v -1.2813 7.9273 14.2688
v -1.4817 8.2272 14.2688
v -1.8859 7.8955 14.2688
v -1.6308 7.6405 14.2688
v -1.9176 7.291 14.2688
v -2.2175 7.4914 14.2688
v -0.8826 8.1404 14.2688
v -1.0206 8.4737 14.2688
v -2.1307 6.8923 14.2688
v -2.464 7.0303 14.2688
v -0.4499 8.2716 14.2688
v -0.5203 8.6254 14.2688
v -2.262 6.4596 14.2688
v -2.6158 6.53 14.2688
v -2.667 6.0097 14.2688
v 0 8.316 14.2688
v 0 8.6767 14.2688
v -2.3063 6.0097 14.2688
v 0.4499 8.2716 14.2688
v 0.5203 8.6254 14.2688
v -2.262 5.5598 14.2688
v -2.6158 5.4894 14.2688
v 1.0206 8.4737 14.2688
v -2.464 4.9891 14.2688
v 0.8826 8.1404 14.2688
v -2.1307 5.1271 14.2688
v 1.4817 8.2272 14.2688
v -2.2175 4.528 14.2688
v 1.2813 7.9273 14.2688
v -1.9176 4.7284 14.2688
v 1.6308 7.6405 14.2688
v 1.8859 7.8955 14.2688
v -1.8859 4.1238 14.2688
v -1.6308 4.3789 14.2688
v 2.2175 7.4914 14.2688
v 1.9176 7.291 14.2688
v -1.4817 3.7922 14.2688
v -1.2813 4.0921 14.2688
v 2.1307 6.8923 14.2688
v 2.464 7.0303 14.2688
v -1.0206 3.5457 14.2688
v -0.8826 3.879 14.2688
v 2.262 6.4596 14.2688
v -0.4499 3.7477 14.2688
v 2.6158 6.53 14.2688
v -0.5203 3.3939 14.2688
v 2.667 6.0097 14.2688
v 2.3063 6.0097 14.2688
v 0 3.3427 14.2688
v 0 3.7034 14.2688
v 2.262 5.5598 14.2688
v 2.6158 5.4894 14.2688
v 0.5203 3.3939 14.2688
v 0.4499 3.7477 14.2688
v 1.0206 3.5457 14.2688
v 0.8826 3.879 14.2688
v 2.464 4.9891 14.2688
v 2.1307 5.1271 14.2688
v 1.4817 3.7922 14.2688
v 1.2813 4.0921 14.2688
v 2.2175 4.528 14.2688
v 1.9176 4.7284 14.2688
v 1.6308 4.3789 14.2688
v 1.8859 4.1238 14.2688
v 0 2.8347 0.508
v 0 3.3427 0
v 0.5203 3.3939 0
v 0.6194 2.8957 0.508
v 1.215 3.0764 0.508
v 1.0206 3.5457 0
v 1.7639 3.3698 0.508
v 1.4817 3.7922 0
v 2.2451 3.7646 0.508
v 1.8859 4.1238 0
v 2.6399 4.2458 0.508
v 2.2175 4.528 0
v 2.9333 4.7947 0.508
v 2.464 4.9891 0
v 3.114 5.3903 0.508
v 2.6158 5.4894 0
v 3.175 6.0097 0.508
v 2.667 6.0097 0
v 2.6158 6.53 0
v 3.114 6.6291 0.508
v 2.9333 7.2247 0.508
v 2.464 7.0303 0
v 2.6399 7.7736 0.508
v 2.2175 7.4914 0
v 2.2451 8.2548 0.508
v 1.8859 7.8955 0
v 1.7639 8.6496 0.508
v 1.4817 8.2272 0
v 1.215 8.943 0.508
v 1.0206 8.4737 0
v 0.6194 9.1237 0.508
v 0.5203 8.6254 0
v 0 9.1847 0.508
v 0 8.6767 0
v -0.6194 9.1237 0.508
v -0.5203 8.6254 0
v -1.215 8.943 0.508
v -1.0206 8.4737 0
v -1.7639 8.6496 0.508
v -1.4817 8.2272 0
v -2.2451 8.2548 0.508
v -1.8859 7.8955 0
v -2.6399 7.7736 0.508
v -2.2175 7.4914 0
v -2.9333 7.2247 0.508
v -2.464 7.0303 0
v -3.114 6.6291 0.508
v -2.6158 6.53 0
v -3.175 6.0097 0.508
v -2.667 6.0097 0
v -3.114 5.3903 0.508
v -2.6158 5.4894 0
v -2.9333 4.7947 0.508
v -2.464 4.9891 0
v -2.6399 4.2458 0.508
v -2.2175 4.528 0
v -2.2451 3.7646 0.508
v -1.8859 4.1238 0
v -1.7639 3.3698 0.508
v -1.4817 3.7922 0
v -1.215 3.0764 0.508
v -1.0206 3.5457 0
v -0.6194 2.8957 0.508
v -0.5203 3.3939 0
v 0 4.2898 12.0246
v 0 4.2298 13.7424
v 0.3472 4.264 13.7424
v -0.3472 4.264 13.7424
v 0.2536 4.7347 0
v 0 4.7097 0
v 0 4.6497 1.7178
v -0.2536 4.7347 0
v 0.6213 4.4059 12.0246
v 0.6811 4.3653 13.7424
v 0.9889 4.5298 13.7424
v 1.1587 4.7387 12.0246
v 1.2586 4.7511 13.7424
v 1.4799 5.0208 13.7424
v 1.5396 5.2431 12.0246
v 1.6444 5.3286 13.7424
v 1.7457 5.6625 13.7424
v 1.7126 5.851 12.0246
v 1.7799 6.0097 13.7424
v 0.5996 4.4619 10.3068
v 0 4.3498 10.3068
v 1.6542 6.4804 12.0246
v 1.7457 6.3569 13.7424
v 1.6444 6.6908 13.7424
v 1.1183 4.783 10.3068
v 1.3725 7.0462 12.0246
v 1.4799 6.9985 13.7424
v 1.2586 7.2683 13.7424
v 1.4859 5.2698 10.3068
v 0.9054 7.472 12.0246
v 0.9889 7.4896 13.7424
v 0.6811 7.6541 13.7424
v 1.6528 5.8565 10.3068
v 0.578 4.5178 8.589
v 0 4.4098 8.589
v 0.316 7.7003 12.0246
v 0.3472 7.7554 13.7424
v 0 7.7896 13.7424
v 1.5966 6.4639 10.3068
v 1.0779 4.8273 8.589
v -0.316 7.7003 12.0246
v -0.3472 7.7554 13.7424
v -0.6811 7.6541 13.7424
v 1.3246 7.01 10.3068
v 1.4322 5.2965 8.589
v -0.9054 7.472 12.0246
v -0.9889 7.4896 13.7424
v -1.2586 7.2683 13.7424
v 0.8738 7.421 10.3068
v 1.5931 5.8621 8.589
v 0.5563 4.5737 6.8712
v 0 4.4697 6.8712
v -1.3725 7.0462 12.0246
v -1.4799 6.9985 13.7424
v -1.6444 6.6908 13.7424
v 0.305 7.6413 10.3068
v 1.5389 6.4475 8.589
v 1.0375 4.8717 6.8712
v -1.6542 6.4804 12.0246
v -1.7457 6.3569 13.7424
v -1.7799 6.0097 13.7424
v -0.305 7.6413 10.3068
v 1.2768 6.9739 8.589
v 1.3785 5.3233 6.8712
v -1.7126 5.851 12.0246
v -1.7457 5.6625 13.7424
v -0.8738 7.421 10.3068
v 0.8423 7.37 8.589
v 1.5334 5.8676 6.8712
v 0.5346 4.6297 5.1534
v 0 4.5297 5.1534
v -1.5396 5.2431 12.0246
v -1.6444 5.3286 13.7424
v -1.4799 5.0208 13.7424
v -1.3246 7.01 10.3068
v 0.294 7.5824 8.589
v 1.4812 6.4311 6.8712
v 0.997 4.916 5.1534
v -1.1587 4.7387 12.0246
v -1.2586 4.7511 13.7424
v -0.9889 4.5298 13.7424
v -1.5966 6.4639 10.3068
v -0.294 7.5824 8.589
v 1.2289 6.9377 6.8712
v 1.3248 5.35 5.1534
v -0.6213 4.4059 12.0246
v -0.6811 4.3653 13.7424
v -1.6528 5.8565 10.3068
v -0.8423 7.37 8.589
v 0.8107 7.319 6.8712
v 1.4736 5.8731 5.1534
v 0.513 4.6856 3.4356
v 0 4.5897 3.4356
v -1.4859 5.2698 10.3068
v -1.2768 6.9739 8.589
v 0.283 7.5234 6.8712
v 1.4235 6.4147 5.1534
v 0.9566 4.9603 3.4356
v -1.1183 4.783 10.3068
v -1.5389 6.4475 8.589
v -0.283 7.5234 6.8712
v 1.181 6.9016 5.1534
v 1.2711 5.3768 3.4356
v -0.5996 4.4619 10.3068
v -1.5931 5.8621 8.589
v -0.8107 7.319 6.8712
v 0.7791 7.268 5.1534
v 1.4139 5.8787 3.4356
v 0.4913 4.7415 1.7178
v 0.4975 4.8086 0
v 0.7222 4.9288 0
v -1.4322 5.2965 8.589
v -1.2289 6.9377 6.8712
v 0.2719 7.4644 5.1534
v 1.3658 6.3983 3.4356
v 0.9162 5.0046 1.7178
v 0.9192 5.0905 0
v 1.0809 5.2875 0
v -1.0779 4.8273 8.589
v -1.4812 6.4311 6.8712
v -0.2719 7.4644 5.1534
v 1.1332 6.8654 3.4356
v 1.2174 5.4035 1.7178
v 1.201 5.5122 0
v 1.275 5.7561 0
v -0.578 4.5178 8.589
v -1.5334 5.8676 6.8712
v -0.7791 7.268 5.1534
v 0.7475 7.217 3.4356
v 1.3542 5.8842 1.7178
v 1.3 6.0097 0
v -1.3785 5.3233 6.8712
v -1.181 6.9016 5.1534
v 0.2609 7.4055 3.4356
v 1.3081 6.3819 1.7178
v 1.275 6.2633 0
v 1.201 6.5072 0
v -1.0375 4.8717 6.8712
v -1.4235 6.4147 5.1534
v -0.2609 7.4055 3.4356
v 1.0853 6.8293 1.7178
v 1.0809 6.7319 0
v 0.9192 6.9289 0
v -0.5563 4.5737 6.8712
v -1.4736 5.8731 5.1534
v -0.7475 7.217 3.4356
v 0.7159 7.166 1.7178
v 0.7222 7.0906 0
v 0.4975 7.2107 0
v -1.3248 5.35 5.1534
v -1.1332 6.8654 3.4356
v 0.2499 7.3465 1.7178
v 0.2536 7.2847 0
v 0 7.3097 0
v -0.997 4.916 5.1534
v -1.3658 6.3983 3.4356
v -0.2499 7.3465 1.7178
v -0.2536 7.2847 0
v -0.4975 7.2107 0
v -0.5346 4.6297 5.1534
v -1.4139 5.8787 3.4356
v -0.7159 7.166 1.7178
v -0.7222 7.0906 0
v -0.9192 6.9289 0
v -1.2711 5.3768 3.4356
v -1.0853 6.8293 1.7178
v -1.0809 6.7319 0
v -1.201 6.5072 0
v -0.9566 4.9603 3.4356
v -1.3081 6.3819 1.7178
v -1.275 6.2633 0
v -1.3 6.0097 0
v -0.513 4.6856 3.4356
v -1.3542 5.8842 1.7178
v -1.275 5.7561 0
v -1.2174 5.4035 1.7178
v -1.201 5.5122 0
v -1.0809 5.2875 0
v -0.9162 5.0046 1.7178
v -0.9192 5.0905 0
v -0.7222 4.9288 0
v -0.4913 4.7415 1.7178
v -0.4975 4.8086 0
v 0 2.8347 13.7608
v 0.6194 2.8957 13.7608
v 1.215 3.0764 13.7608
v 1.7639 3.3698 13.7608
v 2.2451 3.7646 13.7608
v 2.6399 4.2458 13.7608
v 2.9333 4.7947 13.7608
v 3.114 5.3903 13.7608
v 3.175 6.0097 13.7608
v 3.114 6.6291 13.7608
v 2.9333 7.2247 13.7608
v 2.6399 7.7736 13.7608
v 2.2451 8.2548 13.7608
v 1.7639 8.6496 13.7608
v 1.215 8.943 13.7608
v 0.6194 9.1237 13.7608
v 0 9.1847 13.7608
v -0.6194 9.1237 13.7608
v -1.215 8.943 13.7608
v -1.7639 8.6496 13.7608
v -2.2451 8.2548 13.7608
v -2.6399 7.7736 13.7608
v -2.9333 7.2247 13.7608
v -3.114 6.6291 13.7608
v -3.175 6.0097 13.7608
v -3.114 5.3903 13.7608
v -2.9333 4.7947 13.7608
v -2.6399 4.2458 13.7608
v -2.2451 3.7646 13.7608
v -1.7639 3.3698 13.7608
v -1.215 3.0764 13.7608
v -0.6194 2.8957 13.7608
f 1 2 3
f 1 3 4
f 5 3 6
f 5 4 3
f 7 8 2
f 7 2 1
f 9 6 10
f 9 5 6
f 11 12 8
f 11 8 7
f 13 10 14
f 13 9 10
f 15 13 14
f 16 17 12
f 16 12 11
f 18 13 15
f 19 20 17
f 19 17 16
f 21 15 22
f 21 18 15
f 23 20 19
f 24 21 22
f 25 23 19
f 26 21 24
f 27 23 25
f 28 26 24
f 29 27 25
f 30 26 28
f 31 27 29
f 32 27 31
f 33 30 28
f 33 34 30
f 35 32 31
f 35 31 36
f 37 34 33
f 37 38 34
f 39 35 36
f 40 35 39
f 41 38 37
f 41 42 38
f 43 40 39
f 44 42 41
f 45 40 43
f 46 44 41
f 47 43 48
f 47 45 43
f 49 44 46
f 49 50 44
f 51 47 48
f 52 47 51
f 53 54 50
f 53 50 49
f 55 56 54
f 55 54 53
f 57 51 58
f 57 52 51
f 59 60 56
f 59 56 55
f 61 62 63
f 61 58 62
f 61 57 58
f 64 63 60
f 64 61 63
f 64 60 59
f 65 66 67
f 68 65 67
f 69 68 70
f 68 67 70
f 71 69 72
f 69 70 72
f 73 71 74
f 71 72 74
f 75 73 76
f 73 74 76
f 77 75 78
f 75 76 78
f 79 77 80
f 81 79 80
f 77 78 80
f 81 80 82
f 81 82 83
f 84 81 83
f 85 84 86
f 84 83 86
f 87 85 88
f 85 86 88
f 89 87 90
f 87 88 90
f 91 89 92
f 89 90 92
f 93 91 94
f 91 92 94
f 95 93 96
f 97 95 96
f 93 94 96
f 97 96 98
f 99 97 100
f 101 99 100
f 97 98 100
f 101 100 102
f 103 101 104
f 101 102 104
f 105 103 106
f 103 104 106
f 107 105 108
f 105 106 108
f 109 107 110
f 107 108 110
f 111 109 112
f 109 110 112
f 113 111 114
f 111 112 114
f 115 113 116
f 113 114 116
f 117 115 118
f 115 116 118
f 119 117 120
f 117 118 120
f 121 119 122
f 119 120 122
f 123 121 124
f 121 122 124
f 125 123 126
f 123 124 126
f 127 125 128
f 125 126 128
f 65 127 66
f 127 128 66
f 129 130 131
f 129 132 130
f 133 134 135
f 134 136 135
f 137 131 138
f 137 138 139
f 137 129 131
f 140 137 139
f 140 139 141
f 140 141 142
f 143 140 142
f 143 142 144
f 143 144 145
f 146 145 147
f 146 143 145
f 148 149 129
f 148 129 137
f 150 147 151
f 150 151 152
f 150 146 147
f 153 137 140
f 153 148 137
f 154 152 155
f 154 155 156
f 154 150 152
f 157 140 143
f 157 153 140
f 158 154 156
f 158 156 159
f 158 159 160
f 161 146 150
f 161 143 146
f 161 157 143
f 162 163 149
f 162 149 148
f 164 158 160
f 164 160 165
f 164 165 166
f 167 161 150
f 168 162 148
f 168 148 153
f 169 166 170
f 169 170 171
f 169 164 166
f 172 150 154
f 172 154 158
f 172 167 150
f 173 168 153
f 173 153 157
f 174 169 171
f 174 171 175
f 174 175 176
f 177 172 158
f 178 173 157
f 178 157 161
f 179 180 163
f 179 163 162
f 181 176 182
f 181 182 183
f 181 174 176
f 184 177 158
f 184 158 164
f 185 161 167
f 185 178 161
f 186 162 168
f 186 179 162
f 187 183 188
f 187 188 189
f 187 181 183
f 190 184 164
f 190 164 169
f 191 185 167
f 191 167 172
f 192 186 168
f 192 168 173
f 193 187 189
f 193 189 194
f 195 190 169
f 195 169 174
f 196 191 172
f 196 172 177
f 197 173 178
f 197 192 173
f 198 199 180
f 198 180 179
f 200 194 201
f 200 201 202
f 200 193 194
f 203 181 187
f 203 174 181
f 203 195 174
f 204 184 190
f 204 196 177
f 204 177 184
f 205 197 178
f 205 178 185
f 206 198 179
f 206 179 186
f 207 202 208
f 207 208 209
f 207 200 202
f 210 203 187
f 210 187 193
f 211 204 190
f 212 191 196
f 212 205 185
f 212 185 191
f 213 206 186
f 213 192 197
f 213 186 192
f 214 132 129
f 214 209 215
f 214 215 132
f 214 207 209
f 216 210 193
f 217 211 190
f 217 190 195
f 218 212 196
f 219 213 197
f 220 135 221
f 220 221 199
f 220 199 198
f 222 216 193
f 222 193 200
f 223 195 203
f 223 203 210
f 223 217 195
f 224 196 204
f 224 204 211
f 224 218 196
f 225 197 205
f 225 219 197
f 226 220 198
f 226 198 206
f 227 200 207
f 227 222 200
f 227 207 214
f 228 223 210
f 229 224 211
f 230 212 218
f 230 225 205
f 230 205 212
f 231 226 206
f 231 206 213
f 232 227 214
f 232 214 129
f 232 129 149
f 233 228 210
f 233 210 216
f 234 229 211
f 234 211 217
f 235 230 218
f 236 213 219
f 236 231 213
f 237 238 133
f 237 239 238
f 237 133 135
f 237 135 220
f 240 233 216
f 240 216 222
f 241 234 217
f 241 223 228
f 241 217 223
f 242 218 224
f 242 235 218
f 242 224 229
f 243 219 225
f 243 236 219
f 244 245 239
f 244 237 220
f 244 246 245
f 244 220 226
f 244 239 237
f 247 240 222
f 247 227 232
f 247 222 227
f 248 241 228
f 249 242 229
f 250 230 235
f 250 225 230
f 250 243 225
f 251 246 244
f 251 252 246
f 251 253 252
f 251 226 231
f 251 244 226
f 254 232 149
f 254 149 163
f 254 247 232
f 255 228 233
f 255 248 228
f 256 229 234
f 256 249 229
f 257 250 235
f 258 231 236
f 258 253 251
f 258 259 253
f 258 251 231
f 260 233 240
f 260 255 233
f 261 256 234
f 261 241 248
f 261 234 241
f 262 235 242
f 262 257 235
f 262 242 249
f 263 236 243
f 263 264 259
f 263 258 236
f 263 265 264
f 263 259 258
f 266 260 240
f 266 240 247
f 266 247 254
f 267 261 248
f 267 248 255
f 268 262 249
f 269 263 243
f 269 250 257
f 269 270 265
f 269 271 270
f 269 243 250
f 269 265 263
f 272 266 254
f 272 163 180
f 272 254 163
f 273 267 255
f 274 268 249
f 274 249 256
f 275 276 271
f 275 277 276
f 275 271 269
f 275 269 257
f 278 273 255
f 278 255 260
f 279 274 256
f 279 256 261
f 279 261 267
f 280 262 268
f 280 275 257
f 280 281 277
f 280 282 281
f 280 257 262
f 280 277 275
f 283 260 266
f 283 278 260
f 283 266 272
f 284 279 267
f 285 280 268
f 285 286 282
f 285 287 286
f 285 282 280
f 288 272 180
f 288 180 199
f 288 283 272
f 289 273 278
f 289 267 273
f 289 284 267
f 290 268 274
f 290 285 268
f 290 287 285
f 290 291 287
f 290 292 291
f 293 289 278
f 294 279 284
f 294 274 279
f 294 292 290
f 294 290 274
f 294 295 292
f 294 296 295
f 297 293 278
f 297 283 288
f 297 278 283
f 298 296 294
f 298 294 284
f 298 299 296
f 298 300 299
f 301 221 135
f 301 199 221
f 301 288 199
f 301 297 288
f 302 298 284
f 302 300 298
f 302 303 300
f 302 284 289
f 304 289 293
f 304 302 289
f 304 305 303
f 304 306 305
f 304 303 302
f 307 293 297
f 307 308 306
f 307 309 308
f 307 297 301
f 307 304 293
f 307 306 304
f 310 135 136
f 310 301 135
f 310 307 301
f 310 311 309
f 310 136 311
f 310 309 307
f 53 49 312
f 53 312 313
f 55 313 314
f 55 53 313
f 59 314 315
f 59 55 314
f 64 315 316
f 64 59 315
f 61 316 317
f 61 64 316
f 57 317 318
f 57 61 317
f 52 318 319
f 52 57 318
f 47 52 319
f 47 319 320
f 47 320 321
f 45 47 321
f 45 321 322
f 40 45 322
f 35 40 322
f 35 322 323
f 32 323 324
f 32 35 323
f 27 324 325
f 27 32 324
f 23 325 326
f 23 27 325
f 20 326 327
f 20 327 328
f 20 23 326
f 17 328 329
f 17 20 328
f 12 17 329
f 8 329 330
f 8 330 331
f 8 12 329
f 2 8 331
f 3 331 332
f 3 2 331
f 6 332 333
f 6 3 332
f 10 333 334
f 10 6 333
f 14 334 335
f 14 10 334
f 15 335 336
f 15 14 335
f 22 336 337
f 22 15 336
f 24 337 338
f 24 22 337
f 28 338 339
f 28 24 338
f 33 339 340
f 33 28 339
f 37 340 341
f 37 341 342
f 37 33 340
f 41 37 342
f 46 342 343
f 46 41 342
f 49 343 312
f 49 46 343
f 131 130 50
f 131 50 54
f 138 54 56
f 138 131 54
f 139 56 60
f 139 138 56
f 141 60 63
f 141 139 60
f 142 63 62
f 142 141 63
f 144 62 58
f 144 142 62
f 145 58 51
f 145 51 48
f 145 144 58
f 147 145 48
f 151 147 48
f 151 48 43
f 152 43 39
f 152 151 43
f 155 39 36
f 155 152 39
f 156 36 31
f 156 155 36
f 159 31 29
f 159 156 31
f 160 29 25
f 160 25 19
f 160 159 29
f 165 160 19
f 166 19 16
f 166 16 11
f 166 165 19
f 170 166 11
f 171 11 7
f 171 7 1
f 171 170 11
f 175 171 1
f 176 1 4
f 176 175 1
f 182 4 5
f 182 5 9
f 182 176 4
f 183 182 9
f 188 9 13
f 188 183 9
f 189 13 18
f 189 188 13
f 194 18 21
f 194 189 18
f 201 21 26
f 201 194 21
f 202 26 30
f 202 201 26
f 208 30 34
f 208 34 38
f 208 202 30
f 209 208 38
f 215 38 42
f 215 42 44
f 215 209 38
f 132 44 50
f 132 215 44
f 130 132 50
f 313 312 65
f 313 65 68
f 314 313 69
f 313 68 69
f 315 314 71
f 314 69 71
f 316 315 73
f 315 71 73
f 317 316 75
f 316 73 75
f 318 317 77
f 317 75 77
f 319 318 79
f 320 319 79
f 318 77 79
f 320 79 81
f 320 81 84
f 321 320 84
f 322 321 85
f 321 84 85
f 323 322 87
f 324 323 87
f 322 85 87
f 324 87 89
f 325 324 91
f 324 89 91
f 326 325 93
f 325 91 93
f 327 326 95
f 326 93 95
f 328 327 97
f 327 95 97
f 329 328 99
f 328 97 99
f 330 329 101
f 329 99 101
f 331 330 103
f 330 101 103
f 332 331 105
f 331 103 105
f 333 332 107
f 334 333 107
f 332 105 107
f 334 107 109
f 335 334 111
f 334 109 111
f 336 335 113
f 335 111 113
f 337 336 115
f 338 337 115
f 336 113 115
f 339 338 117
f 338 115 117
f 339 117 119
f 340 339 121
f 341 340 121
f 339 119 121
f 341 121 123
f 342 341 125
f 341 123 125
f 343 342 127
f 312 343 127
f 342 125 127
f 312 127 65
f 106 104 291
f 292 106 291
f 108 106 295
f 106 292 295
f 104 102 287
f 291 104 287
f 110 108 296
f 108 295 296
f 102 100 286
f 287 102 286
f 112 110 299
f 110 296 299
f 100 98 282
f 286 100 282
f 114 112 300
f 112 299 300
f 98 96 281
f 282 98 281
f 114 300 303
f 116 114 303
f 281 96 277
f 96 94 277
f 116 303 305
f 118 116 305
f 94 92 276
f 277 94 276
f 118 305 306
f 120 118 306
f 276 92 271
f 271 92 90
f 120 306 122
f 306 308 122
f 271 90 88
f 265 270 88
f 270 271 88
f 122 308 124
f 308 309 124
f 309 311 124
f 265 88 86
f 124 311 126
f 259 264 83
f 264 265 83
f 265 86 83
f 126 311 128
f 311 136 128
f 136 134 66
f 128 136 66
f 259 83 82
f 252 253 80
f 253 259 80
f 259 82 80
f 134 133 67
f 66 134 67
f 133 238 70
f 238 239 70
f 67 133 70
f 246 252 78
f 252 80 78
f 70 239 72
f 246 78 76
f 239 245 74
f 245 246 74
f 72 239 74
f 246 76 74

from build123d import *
from OCP.BRepFilletAPI import BRepFilletAPI_MakeChamfer

# Parameters (mm, degrees)
SKETCH1_R           = 3.175
SKETCH1_R_2         = 1.2999974
BOSS_EXTRUDE1_DEPTH = 14.26875
DRAFT2_ANGLE        = -2
CHAMFER1_SIZE       = 0.508
CHAMFER1_SIZE2      = 0.526702505


with BuildPart() as part:
    # Sketch1 → Boss-Extrude1 (new body)
    with BuildSketch(Plane.XY):
        with Locations(Location((0, 6.009690382, 0), (0, 0, 270))):
            Circle(SKETCH1_R)
        with Locations(Location((0, 6.009690382, 0), (0, 0, 270))):
            Circle(SKETCH1_R_2, mode=Mode.SUBTRACT)
    extrude(amount=BOSS_EXTRUDE1_DEPTH)

    # Draft2
    draft2_faces = [part.faces().sort_by_distance(p)[0] for p in [
        (0, 7.309687782, 7.134375),
    ]]
    draft(draft2_faces, Plane(origin=(0, 6.009690382, 0), x_dir=(-1, 0, 0), z_dir=(0, 0, -1)), DRAFT2_ANGLE)

    # Chamfer1: one chamfer whose edges measure the first distance from different faces: ONE call of the kernel's chamfer builder (chamfer() names one face for all edges)
    chamfer1_edges_1 = [part.edges().sort_by_distance(p)[0] for p in [
        (0, 9.184690382, 14.26875),
        (0, 9.184690382, 0),
    ]]
    chamfer1_edges_2 = [part.edges().sort_by_distance(p)[0] for p in [
        (0, 7.807963512, 14.26875),
    ]]
    chamfer1_side_2 = [part.faces().sort_by_distance(p)[0] for p in [
        (0, 9.094887821, 14.26875),
    ]]
    chamfer1 = BRepFilletAPI_MakeChamfer(part.part.solid().wrapped)
    for e in chamfer1_edges_1:
        chamfer1.Add(CHAMFER1_SIZE, e.wrapped)
    for e in chamfer1_edges_2:
        chamfer1.Add(CHAMFER1_SIZE, CHAMFER1_SIZE2, e.wrapped, chamfer1_side_2[0].wrapped)  # the first distance lies on this face
    add(Compound.cast(chamfer1.Shape()), mode=Mode.REPLACE)


solid = part.part
